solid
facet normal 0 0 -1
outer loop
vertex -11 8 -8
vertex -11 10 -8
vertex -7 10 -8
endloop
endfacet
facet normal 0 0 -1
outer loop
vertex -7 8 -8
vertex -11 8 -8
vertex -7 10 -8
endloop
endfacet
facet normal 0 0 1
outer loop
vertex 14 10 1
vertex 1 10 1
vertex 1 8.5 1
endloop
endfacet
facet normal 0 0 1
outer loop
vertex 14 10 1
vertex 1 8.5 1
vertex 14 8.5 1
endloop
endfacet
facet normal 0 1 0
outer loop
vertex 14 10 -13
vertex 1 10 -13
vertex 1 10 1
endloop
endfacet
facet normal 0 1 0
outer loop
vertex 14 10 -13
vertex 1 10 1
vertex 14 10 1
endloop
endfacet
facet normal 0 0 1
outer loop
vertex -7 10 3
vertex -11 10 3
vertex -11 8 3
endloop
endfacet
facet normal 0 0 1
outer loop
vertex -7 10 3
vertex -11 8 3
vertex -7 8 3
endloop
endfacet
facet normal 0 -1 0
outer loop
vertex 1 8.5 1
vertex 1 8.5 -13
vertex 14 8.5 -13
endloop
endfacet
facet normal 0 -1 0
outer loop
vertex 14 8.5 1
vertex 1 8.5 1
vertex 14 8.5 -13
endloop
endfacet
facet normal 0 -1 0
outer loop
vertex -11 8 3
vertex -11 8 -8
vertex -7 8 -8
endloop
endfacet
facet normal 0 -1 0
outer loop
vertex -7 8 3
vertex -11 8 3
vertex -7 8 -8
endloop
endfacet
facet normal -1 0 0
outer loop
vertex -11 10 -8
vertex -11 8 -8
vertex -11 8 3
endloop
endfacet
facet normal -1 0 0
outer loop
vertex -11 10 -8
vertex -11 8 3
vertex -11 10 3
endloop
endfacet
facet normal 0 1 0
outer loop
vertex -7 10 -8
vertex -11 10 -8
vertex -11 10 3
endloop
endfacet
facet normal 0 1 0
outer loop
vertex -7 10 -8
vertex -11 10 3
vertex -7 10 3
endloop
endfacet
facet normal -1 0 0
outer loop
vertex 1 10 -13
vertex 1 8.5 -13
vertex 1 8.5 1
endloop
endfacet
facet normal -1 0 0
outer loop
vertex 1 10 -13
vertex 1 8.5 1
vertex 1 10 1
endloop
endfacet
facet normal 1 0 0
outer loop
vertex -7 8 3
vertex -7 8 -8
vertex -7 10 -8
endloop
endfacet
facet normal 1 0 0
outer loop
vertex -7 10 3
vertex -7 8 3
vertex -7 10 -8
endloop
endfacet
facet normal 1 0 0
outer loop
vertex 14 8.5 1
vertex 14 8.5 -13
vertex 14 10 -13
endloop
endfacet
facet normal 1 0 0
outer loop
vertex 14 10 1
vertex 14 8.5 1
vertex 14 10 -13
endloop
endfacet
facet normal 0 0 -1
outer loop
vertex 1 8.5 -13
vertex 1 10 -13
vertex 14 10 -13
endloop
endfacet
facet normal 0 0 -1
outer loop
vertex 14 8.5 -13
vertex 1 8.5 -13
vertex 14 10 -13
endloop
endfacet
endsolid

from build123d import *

# Parameters (mm, degrees)
BOX_W        = 13
BOX_H        = 1.5
BOX_DEPTH    = 14
BOX005_W     = 4
BOX005_H     = 2
BOX005_DEPTH = 11


with BuildPart() as cube:
    # Box → Box (new body)
    with BuildSketch(Plane(origin=(1, 8.5, -13), x_dir=(1, 0, 0), z_dir=(0, 0, 1))):
        with Locations((6.5, 0.75)):
            Rectangle(BOX_W, BOX_H)
    extrude(amount=BOX_DEPTH)


with BuildPart() as fusion006007:
    # Box005 → Box005 (new body)
    with BuildSketch(Plane(origin=(-11, 8, -8), x_dir=(1, 0, 0), z_dir=(0, 0, 1))):
        with Locations((2, 1)):
            Rectangle(BOX005_W, BOX005_H)
    extrude(amount=BOX005_DEPTH)

    # Fusion006007: union Cube
    add(cube.part)


solid = fusion006007.part
